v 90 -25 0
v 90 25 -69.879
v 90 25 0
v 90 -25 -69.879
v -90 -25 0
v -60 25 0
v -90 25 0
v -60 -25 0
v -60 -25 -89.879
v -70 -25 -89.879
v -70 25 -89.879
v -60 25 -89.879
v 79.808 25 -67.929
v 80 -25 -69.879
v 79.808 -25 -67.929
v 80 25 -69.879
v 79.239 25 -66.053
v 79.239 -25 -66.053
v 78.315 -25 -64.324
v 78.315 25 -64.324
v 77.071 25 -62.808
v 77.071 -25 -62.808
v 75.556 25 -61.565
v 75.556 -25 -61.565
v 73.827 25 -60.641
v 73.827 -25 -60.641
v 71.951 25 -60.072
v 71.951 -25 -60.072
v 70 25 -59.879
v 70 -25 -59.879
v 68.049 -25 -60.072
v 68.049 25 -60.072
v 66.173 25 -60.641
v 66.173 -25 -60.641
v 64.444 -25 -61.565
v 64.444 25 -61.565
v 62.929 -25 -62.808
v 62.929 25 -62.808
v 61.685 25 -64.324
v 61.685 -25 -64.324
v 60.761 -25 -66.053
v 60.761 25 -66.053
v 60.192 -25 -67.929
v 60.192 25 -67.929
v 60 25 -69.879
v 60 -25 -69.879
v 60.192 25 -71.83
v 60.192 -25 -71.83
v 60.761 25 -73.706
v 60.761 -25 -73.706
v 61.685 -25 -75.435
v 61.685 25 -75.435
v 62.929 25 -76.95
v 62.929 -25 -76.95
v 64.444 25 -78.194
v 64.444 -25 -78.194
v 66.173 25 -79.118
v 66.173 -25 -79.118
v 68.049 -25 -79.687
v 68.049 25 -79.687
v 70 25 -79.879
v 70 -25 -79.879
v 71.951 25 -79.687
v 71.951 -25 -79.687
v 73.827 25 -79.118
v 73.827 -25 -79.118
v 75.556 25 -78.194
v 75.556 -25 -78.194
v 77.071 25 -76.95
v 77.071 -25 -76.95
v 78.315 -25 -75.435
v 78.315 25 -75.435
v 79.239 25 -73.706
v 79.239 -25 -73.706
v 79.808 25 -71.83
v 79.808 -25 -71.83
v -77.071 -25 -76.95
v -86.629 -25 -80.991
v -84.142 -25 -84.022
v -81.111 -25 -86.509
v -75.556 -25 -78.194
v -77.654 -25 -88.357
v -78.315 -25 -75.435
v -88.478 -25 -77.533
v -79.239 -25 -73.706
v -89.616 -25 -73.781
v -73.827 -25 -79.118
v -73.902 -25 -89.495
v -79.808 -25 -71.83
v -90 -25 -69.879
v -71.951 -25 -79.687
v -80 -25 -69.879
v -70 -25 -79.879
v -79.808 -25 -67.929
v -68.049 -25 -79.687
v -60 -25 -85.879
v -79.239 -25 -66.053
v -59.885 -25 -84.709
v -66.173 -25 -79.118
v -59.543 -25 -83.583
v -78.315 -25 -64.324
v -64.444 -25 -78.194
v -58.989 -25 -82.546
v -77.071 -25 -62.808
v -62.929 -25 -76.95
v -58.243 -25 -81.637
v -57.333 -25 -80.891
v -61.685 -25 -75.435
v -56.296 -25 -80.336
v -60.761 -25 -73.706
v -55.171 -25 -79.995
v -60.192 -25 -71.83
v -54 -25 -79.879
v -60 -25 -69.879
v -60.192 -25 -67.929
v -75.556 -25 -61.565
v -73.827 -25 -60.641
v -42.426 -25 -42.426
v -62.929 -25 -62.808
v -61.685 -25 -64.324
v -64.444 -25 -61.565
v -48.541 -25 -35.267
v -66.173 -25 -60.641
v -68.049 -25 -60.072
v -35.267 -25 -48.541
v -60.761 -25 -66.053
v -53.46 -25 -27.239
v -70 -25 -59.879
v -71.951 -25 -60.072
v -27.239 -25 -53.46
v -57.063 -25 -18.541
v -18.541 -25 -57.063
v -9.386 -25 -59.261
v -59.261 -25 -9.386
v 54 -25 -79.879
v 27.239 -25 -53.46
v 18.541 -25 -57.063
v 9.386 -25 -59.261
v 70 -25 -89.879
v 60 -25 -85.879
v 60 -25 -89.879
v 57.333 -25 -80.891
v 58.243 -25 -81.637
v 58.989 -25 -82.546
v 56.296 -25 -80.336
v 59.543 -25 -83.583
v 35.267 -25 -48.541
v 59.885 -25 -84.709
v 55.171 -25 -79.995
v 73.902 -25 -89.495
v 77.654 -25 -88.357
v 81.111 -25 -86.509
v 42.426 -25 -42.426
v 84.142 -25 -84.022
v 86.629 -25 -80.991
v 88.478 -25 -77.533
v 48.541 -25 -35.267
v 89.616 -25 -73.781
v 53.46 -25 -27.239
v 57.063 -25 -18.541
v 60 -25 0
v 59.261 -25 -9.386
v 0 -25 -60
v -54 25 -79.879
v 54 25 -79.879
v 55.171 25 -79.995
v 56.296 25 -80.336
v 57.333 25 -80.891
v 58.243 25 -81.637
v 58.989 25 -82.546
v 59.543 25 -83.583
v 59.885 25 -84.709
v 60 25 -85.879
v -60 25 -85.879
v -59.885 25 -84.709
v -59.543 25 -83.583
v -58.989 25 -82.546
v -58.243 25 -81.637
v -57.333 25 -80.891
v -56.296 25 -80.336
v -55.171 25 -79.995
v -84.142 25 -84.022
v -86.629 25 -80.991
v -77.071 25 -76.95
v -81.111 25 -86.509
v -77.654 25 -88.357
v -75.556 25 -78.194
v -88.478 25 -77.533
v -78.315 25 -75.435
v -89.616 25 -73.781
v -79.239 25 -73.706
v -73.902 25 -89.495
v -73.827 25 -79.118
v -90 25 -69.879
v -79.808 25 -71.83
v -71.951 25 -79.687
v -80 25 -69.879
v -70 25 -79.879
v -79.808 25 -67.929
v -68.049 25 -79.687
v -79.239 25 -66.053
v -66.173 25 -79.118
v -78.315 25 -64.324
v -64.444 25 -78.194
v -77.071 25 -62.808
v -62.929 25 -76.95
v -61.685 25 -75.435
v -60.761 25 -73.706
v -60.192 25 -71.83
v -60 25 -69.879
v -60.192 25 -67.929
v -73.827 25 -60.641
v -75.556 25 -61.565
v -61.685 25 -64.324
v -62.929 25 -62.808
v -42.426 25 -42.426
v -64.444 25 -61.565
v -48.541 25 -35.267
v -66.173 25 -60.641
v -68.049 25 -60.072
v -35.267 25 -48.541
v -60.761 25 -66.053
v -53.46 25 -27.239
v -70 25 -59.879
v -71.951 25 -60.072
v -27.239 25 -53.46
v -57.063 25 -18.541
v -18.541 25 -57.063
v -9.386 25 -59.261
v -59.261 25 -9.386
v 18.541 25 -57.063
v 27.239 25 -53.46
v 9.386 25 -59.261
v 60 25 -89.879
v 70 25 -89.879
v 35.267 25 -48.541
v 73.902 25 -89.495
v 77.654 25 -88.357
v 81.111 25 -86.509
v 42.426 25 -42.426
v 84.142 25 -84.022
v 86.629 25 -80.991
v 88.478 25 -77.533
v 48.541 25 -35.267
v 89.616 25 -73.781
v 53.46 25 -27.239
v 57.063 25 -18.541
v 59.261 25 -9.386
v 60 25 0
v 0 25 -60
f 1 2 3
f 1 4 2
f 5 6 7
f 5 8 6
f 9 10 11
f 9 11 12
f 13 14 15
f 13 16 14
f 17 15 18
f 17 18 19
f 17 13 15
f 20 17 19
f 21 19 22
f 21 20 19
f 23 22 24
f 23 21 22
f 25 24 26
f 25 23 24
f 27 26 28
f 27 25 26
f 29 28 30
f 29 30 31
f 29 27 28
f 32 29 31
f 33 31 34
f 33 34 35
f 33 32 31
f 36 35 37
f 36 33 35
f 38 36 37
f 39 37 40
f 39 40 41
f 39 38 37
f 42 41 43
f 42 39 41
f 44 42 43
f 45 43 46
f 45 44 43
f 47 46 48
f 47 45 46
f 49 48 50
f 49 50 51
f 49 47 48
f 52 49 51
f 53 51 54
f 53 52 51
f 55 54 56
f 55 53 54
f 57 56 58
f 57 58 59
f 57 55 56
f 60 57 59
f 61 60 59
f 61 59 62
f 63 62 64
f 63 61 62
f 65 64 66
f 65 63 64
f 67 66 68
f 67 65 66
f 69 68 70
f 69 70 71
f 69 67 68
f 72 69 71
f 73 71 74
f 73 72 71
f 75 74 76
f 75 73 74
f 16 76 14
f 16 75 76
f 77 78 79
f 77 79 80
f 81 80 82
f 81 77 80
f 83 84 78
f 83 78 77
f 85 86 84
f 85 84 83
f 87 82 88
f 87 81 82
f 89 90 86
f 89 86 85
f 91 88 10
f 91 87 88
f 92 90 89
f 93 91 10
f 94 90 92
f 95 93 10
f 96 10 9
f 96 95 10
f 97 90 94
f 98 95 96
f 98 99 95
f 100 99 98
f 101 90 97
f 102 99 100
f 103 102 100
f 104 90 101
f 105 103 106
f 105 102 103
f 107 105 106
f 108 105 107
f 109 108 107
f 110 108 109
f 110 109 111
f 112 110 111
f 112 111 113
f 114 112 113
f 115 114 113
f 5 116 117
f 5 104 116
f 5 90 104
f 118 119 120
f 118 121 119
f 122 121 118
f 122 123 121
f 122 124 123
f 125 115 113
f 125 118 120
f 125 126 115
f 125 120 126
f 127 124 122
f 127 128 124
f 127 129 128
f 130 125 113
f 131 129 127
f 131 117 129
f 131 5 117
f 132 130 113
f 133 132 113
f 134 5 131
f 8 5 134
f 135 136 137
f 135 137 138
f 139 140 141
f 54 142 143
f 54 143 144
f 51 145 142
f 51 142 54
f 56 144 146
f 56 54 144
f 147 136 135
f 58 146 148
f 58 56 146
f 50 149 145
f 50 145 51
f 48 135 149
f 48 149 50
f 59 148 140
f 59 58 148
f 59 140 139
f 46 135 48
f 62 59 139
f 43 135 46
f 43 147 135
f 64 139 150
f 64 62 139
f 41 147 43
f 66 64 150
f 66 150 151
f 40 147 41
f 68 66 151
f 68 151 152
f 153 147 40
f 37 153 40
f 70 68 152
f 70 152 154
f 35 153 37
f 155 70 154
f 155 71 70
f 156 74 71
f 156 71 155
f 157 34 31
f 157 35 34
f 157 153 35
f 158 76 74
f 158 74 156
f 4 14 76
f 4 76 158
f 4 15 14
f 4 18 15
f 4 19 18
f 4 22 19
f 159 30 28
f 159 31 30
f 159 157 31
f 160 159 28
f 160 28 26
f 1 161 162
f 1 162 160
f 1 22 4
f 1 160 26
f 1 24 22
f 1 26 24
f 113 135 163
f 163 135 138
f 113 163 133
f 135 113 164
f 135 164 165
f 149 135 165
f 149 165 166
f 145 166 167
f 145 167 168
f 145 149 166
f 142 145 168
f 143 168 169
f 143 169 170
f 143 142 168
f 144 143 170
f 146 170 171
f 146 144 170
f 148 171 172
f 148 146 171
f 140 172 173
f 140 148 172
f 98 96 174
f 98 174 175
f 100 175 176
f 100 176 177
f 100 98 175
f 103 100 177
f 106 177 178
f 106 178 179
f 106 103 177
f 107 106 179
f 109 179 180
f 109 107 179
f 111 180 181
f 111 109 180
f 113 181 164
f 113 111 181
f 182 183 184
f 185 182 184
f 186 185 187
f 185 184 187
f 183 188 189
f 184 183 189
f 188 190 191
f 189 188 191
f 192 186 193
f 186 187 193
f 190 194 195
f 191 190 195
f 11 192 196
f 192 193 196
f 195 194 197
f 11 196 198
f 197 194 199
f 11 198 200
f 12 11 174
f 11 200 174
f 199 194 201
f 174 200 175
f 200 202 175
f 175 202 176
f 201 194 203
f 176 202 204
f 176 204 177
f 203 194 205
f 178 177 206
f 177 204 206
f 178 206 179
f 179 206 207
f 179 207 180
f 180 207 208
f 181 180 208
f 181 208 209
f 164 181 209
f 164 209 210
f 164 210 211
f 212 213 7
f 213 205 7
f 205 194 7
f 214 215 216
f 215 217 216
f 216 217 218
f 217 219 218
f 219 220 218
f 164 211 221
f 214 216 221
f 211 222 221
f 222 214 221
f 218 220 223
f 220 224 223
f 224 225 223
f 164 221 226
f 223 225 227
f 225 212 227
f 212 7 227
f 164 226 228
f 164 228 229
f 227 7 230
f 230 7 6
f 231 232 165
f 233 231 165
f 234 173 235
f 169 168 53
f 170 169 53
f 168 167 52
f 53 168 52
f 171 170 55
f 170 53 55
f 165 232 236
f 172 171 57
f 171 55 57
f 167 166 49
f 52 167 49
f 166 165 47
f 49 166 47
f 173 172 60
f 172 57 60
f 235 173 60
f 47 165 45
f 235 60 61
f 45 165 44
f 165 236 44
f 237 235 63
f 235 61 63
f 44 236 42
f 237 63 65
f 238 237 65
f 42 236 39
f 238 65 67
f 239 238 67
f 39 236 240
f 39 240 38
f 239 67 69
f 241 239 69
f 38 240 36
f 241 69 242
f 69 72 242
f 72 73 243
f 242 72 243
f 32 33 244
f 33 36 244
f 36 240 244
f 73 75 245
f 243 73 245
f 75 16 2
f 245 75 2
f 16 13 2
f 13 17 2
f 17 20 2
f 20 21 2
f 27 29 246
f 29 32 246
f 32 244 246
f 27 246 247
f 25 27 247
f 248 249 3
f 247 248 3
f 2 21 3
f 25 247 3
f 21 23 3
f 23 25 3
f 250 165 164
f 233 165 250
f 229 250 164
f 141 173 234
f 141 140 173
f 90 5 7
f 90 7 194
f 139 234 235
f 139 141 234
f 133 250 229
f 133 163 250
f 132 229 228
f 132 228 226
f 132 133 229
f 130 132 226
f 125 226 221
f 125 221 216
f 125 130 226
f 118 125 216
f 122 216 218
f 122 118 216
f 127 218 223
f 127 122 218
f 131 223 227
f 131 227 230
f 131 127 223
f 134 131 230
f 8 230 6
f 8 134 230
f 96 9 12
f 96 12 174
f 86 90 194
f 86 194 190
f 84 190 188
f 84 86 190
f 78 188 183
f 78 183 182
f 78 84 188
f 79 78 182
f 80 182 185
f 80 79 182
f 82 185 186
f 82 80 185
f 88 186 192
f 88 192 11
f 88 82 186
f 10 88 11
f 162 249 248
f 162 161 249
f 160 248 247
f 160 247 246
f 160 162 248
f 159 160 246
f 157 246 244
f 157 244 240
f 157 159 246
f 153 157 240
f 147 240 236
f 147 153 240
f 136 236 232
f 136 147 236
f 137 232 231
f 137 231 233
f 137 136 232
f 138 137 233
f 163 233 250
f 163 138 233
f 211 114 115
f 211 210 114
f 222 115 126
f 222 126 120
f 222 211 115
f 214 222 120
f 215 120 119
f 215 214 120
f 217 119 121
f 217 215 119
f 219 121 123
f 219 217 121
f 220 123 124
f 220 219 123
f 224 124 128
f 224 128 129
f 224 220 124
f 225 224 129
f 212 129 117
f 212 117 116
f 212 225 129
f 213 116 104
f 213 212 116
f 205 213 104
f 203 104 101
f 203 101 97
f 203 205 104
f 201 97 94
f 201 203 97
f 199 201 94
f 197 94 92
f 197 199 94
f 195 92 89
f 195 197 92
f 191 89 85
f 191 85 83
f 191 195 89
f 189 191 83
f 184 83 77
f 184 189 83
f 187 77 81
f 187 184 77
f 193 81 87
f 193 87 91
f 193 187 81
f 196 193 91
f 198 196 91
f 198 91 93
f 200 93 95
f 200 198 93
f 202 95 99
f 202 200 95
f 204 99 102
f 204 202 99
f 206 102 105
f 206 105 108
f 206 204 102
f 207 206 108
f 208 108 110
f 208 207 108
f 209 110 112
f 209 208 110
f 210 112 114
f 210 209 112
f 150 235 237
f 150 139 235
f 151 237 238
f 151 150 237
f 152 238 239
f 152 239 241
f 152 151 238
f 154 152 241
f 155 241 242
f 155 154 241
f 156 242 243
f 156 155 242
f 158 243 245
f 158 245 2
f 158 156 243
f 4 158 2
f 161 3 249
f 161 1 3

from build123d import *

# Parameters (mm, degrees)
F0_R     = 10
F1_DEPTH = 25


with BuildPart() as f1:
    # F0 (on Front) → F1 (new body, symmetric)
    with BuildSketch(Plane.XZ):
        with BuildLine():
            Line((-60, 0), (-90, 0))
            Line((-90, 0), (-90, -69.879413))
            ThreePointArc((-90, -69.879413), (-84.142136, -84.021549), (-70, -89.879413))
            Line((-70, -89.879413), (-60, -89.879413))
            Line((-60, -89.879413), (-60, -85.879413))
            ThreePointArc((-60, -85.879413), (-58.242641, -81.636772), (-54, -79.879413))
            Line((-54, -79.879413), (0, -79.879413))
            Line((0, -79.879413), (54, -79.879413))
            ThreePointArc((54, -79.879413), (58.242641, -81.636772), (60, -85.879413))
            Line((60, -85.879413), (60, -89.879413))
            Line((60, -89.879413), (70, -89.879413))
            ThreePointArc((70, -89.879413), (84.142136, -84.021549), (90, -69.879413))
            Line((90, -69.879413), (90, 0))
            Line((90, 0), (60, 0))
            ThreePointArc((60, 0), (42.426407, -42.426407), (0, -60))
            ThreePointArc((0, -60), (-42.426407, -42.426407), (-60, 0))
        make_face()
        with Locations((-70, -69.879413)):
            Circle(F0_R, mode=Mode.SUBTRACT)
        with Locations((70, -69.879413)):
            Circle(F0_R, mode=Mode.SUBTRACT)
    extrude(amount=F1_DEPTH, both=True)


solid = f1.part
